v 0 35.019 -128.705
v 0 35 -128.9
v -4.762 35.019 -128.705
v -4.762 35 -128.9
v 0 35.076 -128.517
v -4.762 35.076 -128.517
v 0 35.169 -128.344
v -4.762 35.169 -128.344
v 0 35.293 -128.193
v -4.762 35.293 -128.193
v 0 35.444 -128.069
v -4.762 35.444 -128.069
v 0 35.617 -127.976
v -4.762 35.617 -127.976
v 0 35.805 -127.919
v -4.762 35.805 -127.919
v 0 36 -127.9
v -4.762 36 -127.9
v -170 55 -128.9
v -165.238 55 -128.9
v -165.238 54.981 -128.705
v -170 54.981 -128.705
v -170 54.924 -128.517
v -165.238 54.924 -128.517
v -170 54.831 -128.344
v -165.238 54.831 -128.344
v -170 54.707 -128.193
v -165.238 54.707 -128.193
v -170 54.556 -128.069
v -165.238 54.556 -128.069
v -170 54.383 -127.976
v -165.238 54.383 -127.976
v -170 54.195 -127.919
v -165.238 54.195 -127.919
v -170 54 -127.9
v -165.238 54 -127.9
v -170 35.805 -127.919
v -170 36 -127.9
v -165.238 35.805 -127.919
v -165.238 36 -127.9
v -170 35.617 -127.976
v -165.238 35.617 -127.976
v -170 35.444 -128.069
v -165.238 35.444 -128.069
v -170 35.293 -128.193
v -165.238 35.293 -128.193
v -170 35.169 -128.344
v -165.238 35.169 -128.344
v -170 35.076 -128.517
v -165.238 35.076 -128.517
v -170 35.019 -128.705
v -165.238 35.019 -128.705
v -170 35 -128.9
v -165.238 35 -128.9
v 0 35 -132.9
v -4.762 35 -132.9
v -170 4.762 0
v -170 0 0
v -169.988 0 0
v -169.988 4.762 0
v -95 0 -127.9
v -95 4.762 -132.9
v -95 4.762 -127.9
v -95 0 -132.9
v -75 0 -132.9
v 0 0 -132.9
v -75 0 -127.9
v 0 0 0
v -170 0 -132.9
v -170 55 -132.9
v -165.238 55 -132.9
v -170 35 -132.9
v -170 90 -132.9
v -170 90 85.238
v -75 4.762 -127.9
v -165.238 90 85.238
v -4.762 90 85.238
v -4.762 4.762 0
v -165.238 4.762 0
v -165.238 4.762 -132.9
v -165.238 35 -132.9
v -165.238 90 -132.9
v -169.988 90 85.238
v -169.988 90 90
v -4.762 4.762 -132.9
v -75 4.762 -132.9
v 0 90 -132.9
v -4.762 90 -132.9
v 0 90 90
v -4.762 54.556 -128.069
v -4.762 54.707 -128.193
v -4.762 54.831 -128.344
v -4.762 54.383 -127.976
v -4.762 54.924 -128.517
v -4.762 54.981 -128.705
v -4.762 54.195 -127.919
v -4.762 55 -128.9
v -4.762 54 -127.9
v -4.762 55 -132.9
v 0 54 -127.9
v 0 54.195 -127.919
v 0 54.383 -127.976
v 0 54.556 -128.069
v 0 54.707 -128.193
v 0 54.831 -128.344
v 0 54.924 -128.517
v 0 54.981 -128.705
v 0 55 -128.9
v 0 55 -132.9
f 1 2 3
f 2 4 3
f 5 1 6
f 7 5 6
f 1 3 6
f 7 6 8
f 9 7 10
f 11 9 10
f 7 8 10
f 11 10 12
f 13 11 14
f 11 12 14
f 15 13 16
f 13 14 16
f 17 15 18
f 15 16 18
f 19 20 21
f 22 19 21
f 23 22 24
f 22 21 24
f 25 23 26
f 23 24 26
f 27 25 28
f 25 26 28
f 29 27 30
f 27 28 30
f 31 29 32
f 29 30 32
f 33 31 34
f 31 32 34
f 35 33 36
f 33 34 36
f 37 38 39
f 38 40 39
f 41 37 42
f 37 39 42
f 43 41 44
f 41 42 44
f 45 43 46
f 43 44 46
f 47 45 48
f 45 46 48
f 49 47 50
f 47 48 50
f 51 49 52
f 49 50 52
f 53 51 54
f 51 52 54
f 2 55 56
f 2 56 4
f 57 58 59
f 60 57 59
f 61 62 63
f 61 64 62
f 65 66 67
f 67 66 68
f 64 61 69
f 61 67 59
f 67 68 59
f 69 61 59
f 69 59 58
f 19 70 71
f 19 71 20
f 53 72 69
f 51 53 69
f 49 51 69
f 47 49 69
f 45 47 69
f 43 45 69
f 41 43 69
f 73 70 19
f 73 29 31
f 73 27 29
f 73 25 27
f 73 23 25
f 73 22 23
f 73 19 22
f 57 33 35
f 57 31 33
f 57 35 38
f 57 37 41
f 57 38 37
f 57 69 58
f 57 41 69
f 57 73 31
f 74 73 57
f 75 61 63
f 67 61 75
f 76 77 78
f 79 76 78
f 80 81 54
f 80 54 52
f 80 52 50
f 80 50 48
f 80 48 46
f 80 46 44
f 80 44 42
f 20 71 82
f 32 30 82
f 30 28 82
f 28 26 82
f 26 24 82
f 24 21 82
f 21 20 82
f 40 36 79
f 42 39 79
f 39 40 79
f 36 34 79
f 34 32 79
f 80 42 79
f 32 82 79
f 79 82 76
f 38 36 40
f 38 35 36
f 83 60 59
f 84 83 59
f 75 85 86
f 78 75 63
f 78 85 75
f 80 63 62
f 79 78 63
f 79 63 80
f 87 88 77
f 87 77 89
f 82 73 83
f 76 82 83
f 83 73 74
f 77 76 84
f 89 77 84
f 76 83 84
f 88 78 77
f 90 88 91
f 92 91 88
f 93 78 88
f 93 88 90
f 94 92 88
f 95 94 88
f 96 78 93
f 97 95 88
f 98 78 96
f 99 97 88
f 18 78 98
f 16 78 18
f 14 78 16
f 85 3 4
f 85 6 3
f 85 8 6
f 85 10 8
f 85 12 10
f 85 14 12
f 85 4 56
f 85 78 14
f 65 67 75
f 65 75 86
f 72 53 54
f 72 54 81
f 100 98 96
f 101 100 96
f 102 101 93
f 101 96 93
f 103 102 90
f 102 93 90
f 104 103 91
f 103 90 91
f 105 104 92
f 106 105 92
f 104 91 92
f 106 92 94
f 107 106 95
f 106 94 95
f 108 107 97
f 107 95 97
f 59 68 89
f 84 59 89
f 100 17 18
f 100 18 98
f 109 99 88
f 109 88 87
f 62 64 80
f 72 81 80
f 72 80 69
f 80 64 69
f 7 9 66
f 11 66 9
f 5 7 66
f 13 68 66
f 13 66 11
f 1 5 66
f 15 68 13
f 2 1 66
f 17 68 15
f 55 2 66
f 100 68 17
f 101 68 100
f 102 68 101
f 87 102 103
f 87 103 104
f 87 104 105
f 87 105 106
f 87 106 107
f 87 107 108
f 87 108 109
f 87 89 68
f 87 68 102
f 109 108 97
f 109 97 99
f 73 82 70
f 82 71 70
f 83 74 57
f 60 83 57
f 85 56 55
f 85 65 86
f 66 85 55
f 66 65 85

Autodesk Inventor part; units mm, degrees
ref_plane "YZ Plane" through (0, 0, 0) normal (1, 0, 0) x (0, 1, 0)
ref_plane "XZ Plane" through (0, 0, 0) normal (0, 1, 0) x (-1, 0, 0)
ref_plane "XY Plane" through (0, 0, 0) normal (0, 0, 1) x (1, 0, 0)
sketch "Sketch1" plane through (0, 0, 0) normal (0, 1, 0) x (-1, 0, 0)
  line L0 (0, 0) -> (170, 0)
  line L1 (170, 0) -> (170, -132.9)
  line L2 (0, -132.9) -> (0, 0)
  line L3 (170, -132.9) -> (95, -132.9)
  line L4 (75, -132.9) -> (0, -132.9)
  line L5 (95, -132.9) -> (95, -127.9)
  line L6 (95, -127.9) -> (75, -127.9)
  line L7 (75, -127.9) -> (75, -132.9)
  dimension "d0" = 132.9
  dimension "d22" = 170
  dimension "d23" = 75
  dimension "d24" = 75
  dimension "d41" = 5
  dimension "d42" = 5
  dimension "d43" = 75
  dimension "d44" = 20
extrude "Extrusion1" add sketch "Sketch1" along normal blind 4.7625
sketch "Sketch2" plane through (0, 4.7625, 0) normal (0, 1, 0) x (1, 0, 0)
  line L0 (-170, 0) -> (0, 0) projected
  line L1 (0, 132.9) -> (-170, 132.9) projected
  line L2 (-170, 0) -> (-170, 132.9)
  line L3 (-170, 132.9) -> (-165.2375, 132.9)
  line L4 (-165.2375, 132.9) -> (-165.2375, 0)
  line L5 (-170, 0) -> (-165.2375, 0)
  line L6 (0, 0) -> (-4.7625, 0)
  line L7 (-4.7625, 0) -> (-4.7625, 132.9)
  line L8 (-4.7625, 132.9) -> (0, 132.9)
  line L9 (0, 0) -> (0, 132.9) projected
  line L10 (0, 132.9) -> (0, 0)
  dimension "d4" = 4.7625
  dimension "d5" = 4.7625
extrude "Extrusion2" add sketch "Sketch2" along normal blind 85.2375 contours L7 L1 L9 L0
sketch "Sketch3" plane through (0, 4.7625, 0) normal (0, 1, 0) x (1, 0, 0)
  point P0 (0, 0)
sketch "Sketch4" plane through (-170, 0, -132.9) normal (-1, 0, 0) x (0, 0, 1)
  line L0 (132.9, 4.7625) -> (217.7528, 89.6153)
  line L1 (0, 4.7625) -> (132.9, 4.7625) projected
  line L2 (132.9, 0) -> (132.9, 4.7625) projected
  line L3 (0, 0) -> (132.9, 0) projected
  line L4 (132.9, 0) -> (220.1341, 87.2341)
  line L5 (220.1341, 87.2341) -> (217.7528, 89.6153)
  line L6 (132.9, 4.7625) -> (132.9, 0)
  dimension "d8" = 120
  dimension "d9" = 45
sketch "Sketch5" plane through (0, 0, 0) normal (1, 0, 0) x (0, 0, -1)
  line L0 (0, 0) -> (0, 90) projected
  line L1 (0, 90) -> (-90, 90)
  line L2 (132.9, 0) -> (0, 0) projected
  line L3 (-90, 90) -> (0, 0)
  line L4 (0, 0) -> (0, 90)
  dimension "d11" = 45
extrude "Extrusion3" add sketch "Sketch5" against normal blind 105.2375
sketch "Sketch6" plane through (-105.2375, 0, 0) normal (-1, 0, 0) x (0, 0, 1)
  line L0 (0, 0) -> (0, 4.7625) projected
  line L1 (0, 4.7625) -> (0, 90)
  line L2 (-132.9, 90) -> (90, 90) projected
  line L3 (0, 90) -> (85.2375, 90)
  line L4 (85.2375, 90) -> (0, 4.7625)
  line L5 (0, 0) -> (90, 90) projected
extrude "Extrusion4" cut sketch "Sketch6" against normal blind 100.475 contours L1 L2 L4
sketch "Sketch7" plane through (-105.2375, 0, 0) normal (-1, 0, 0) x (0, 0, 1)
  line L0 (0, 4.7625) -> (0, 0)
  line L1 (0, 0) -> (90, 90)
  line L2 (85.2375, 90) -> (0, 4.7625) projected
  line L3 (90, 90) -> (85.2375, 90)
  line L4 (85.2375, 90) -> (0, 4.7625)
extrude "Extrusion5" add sketch "Sketch7" along normal blind 64.75
extrude "Extrusion6" add sketch "Sketch2" along normal blind 85.2375 contours L2 L1 L4 L0
sketch "Sketch8" plane through (-170, 0, -132.9) normal (-1, 0, 0) x (0, 0, 1)
  line L0 (0, 90) -> (222.9, 90) projected
  line L1 (132.9, 90) -> (218.1375, 90)
  line L2 (218.1375, 90) -> (132.9, 4.7625) projected
  line L3 (218.1375, 90) -> (132.9, 4.7625)
  line L4 (132.9, 4.7625) -> (132.9, 90)
  point P0 (132.9, 0)
extrude "Extrusion7" add sketch "Sketch8" against normal blind 4.7625
sketch "Sketch9" plane through (0, 0, -132.9) normal (1, 0, 0) x (0, 0, -1)
  line L0 (0, 0) -> (0, 90) projected
  line L1 (-5, 55) -> (0, 55)
  line L2 (0, 55) -> (0, 35)
  line L3 (0, 35) -> (-5, 35)
  line L4 (-5, 35) -> (-5, 55)
  line L5 (0, 90) -> (-222.9, 90) projected
  line L6 (0, 0) -> (-132.9, 0) projected
  dimension "d28" = 5
  dimension "d29" = 20
  dimension "d30" = 35
  dimension "d31" = 35
extrude "Extrusion8" cut sketch "Sketch9" against normal blind 4.7625
sketch "Sketch10" plane through (-170, 0, -132.9) normal (-1, 0, 0) x (0, 0, 1)
  line L0 (0, 0) -> (0, 90) projected
  line L1 (0, 55) -> (5, 55)
  line L2 (5, 55) -> (5, 35)
  line L3 (5, 35) -> (0, 35)
  line L4 (0, 35) -> (0, 55)
  line L5 (0, 90) -> (218.1375, 90) projected
  line L6 (132.9, 0) -> (0, 0) projected
  dimension "d34" = 20
  dimension "d35" = 5
  dimension "d36" = 35
  dimension "d37" = 35
extrude "Extrusion9" cut sketch "Sketch10" against normal blind 4.7625
fillet "Fillet1" radius 1 4 edges at (-167.6188, 55, -127.9) (-167.6188, 35, -127.9) (-2.3813, 35, -127.9) (-2.3813, 55, -127.9)
properties part number "OpticalDeviceMirrorPart"
